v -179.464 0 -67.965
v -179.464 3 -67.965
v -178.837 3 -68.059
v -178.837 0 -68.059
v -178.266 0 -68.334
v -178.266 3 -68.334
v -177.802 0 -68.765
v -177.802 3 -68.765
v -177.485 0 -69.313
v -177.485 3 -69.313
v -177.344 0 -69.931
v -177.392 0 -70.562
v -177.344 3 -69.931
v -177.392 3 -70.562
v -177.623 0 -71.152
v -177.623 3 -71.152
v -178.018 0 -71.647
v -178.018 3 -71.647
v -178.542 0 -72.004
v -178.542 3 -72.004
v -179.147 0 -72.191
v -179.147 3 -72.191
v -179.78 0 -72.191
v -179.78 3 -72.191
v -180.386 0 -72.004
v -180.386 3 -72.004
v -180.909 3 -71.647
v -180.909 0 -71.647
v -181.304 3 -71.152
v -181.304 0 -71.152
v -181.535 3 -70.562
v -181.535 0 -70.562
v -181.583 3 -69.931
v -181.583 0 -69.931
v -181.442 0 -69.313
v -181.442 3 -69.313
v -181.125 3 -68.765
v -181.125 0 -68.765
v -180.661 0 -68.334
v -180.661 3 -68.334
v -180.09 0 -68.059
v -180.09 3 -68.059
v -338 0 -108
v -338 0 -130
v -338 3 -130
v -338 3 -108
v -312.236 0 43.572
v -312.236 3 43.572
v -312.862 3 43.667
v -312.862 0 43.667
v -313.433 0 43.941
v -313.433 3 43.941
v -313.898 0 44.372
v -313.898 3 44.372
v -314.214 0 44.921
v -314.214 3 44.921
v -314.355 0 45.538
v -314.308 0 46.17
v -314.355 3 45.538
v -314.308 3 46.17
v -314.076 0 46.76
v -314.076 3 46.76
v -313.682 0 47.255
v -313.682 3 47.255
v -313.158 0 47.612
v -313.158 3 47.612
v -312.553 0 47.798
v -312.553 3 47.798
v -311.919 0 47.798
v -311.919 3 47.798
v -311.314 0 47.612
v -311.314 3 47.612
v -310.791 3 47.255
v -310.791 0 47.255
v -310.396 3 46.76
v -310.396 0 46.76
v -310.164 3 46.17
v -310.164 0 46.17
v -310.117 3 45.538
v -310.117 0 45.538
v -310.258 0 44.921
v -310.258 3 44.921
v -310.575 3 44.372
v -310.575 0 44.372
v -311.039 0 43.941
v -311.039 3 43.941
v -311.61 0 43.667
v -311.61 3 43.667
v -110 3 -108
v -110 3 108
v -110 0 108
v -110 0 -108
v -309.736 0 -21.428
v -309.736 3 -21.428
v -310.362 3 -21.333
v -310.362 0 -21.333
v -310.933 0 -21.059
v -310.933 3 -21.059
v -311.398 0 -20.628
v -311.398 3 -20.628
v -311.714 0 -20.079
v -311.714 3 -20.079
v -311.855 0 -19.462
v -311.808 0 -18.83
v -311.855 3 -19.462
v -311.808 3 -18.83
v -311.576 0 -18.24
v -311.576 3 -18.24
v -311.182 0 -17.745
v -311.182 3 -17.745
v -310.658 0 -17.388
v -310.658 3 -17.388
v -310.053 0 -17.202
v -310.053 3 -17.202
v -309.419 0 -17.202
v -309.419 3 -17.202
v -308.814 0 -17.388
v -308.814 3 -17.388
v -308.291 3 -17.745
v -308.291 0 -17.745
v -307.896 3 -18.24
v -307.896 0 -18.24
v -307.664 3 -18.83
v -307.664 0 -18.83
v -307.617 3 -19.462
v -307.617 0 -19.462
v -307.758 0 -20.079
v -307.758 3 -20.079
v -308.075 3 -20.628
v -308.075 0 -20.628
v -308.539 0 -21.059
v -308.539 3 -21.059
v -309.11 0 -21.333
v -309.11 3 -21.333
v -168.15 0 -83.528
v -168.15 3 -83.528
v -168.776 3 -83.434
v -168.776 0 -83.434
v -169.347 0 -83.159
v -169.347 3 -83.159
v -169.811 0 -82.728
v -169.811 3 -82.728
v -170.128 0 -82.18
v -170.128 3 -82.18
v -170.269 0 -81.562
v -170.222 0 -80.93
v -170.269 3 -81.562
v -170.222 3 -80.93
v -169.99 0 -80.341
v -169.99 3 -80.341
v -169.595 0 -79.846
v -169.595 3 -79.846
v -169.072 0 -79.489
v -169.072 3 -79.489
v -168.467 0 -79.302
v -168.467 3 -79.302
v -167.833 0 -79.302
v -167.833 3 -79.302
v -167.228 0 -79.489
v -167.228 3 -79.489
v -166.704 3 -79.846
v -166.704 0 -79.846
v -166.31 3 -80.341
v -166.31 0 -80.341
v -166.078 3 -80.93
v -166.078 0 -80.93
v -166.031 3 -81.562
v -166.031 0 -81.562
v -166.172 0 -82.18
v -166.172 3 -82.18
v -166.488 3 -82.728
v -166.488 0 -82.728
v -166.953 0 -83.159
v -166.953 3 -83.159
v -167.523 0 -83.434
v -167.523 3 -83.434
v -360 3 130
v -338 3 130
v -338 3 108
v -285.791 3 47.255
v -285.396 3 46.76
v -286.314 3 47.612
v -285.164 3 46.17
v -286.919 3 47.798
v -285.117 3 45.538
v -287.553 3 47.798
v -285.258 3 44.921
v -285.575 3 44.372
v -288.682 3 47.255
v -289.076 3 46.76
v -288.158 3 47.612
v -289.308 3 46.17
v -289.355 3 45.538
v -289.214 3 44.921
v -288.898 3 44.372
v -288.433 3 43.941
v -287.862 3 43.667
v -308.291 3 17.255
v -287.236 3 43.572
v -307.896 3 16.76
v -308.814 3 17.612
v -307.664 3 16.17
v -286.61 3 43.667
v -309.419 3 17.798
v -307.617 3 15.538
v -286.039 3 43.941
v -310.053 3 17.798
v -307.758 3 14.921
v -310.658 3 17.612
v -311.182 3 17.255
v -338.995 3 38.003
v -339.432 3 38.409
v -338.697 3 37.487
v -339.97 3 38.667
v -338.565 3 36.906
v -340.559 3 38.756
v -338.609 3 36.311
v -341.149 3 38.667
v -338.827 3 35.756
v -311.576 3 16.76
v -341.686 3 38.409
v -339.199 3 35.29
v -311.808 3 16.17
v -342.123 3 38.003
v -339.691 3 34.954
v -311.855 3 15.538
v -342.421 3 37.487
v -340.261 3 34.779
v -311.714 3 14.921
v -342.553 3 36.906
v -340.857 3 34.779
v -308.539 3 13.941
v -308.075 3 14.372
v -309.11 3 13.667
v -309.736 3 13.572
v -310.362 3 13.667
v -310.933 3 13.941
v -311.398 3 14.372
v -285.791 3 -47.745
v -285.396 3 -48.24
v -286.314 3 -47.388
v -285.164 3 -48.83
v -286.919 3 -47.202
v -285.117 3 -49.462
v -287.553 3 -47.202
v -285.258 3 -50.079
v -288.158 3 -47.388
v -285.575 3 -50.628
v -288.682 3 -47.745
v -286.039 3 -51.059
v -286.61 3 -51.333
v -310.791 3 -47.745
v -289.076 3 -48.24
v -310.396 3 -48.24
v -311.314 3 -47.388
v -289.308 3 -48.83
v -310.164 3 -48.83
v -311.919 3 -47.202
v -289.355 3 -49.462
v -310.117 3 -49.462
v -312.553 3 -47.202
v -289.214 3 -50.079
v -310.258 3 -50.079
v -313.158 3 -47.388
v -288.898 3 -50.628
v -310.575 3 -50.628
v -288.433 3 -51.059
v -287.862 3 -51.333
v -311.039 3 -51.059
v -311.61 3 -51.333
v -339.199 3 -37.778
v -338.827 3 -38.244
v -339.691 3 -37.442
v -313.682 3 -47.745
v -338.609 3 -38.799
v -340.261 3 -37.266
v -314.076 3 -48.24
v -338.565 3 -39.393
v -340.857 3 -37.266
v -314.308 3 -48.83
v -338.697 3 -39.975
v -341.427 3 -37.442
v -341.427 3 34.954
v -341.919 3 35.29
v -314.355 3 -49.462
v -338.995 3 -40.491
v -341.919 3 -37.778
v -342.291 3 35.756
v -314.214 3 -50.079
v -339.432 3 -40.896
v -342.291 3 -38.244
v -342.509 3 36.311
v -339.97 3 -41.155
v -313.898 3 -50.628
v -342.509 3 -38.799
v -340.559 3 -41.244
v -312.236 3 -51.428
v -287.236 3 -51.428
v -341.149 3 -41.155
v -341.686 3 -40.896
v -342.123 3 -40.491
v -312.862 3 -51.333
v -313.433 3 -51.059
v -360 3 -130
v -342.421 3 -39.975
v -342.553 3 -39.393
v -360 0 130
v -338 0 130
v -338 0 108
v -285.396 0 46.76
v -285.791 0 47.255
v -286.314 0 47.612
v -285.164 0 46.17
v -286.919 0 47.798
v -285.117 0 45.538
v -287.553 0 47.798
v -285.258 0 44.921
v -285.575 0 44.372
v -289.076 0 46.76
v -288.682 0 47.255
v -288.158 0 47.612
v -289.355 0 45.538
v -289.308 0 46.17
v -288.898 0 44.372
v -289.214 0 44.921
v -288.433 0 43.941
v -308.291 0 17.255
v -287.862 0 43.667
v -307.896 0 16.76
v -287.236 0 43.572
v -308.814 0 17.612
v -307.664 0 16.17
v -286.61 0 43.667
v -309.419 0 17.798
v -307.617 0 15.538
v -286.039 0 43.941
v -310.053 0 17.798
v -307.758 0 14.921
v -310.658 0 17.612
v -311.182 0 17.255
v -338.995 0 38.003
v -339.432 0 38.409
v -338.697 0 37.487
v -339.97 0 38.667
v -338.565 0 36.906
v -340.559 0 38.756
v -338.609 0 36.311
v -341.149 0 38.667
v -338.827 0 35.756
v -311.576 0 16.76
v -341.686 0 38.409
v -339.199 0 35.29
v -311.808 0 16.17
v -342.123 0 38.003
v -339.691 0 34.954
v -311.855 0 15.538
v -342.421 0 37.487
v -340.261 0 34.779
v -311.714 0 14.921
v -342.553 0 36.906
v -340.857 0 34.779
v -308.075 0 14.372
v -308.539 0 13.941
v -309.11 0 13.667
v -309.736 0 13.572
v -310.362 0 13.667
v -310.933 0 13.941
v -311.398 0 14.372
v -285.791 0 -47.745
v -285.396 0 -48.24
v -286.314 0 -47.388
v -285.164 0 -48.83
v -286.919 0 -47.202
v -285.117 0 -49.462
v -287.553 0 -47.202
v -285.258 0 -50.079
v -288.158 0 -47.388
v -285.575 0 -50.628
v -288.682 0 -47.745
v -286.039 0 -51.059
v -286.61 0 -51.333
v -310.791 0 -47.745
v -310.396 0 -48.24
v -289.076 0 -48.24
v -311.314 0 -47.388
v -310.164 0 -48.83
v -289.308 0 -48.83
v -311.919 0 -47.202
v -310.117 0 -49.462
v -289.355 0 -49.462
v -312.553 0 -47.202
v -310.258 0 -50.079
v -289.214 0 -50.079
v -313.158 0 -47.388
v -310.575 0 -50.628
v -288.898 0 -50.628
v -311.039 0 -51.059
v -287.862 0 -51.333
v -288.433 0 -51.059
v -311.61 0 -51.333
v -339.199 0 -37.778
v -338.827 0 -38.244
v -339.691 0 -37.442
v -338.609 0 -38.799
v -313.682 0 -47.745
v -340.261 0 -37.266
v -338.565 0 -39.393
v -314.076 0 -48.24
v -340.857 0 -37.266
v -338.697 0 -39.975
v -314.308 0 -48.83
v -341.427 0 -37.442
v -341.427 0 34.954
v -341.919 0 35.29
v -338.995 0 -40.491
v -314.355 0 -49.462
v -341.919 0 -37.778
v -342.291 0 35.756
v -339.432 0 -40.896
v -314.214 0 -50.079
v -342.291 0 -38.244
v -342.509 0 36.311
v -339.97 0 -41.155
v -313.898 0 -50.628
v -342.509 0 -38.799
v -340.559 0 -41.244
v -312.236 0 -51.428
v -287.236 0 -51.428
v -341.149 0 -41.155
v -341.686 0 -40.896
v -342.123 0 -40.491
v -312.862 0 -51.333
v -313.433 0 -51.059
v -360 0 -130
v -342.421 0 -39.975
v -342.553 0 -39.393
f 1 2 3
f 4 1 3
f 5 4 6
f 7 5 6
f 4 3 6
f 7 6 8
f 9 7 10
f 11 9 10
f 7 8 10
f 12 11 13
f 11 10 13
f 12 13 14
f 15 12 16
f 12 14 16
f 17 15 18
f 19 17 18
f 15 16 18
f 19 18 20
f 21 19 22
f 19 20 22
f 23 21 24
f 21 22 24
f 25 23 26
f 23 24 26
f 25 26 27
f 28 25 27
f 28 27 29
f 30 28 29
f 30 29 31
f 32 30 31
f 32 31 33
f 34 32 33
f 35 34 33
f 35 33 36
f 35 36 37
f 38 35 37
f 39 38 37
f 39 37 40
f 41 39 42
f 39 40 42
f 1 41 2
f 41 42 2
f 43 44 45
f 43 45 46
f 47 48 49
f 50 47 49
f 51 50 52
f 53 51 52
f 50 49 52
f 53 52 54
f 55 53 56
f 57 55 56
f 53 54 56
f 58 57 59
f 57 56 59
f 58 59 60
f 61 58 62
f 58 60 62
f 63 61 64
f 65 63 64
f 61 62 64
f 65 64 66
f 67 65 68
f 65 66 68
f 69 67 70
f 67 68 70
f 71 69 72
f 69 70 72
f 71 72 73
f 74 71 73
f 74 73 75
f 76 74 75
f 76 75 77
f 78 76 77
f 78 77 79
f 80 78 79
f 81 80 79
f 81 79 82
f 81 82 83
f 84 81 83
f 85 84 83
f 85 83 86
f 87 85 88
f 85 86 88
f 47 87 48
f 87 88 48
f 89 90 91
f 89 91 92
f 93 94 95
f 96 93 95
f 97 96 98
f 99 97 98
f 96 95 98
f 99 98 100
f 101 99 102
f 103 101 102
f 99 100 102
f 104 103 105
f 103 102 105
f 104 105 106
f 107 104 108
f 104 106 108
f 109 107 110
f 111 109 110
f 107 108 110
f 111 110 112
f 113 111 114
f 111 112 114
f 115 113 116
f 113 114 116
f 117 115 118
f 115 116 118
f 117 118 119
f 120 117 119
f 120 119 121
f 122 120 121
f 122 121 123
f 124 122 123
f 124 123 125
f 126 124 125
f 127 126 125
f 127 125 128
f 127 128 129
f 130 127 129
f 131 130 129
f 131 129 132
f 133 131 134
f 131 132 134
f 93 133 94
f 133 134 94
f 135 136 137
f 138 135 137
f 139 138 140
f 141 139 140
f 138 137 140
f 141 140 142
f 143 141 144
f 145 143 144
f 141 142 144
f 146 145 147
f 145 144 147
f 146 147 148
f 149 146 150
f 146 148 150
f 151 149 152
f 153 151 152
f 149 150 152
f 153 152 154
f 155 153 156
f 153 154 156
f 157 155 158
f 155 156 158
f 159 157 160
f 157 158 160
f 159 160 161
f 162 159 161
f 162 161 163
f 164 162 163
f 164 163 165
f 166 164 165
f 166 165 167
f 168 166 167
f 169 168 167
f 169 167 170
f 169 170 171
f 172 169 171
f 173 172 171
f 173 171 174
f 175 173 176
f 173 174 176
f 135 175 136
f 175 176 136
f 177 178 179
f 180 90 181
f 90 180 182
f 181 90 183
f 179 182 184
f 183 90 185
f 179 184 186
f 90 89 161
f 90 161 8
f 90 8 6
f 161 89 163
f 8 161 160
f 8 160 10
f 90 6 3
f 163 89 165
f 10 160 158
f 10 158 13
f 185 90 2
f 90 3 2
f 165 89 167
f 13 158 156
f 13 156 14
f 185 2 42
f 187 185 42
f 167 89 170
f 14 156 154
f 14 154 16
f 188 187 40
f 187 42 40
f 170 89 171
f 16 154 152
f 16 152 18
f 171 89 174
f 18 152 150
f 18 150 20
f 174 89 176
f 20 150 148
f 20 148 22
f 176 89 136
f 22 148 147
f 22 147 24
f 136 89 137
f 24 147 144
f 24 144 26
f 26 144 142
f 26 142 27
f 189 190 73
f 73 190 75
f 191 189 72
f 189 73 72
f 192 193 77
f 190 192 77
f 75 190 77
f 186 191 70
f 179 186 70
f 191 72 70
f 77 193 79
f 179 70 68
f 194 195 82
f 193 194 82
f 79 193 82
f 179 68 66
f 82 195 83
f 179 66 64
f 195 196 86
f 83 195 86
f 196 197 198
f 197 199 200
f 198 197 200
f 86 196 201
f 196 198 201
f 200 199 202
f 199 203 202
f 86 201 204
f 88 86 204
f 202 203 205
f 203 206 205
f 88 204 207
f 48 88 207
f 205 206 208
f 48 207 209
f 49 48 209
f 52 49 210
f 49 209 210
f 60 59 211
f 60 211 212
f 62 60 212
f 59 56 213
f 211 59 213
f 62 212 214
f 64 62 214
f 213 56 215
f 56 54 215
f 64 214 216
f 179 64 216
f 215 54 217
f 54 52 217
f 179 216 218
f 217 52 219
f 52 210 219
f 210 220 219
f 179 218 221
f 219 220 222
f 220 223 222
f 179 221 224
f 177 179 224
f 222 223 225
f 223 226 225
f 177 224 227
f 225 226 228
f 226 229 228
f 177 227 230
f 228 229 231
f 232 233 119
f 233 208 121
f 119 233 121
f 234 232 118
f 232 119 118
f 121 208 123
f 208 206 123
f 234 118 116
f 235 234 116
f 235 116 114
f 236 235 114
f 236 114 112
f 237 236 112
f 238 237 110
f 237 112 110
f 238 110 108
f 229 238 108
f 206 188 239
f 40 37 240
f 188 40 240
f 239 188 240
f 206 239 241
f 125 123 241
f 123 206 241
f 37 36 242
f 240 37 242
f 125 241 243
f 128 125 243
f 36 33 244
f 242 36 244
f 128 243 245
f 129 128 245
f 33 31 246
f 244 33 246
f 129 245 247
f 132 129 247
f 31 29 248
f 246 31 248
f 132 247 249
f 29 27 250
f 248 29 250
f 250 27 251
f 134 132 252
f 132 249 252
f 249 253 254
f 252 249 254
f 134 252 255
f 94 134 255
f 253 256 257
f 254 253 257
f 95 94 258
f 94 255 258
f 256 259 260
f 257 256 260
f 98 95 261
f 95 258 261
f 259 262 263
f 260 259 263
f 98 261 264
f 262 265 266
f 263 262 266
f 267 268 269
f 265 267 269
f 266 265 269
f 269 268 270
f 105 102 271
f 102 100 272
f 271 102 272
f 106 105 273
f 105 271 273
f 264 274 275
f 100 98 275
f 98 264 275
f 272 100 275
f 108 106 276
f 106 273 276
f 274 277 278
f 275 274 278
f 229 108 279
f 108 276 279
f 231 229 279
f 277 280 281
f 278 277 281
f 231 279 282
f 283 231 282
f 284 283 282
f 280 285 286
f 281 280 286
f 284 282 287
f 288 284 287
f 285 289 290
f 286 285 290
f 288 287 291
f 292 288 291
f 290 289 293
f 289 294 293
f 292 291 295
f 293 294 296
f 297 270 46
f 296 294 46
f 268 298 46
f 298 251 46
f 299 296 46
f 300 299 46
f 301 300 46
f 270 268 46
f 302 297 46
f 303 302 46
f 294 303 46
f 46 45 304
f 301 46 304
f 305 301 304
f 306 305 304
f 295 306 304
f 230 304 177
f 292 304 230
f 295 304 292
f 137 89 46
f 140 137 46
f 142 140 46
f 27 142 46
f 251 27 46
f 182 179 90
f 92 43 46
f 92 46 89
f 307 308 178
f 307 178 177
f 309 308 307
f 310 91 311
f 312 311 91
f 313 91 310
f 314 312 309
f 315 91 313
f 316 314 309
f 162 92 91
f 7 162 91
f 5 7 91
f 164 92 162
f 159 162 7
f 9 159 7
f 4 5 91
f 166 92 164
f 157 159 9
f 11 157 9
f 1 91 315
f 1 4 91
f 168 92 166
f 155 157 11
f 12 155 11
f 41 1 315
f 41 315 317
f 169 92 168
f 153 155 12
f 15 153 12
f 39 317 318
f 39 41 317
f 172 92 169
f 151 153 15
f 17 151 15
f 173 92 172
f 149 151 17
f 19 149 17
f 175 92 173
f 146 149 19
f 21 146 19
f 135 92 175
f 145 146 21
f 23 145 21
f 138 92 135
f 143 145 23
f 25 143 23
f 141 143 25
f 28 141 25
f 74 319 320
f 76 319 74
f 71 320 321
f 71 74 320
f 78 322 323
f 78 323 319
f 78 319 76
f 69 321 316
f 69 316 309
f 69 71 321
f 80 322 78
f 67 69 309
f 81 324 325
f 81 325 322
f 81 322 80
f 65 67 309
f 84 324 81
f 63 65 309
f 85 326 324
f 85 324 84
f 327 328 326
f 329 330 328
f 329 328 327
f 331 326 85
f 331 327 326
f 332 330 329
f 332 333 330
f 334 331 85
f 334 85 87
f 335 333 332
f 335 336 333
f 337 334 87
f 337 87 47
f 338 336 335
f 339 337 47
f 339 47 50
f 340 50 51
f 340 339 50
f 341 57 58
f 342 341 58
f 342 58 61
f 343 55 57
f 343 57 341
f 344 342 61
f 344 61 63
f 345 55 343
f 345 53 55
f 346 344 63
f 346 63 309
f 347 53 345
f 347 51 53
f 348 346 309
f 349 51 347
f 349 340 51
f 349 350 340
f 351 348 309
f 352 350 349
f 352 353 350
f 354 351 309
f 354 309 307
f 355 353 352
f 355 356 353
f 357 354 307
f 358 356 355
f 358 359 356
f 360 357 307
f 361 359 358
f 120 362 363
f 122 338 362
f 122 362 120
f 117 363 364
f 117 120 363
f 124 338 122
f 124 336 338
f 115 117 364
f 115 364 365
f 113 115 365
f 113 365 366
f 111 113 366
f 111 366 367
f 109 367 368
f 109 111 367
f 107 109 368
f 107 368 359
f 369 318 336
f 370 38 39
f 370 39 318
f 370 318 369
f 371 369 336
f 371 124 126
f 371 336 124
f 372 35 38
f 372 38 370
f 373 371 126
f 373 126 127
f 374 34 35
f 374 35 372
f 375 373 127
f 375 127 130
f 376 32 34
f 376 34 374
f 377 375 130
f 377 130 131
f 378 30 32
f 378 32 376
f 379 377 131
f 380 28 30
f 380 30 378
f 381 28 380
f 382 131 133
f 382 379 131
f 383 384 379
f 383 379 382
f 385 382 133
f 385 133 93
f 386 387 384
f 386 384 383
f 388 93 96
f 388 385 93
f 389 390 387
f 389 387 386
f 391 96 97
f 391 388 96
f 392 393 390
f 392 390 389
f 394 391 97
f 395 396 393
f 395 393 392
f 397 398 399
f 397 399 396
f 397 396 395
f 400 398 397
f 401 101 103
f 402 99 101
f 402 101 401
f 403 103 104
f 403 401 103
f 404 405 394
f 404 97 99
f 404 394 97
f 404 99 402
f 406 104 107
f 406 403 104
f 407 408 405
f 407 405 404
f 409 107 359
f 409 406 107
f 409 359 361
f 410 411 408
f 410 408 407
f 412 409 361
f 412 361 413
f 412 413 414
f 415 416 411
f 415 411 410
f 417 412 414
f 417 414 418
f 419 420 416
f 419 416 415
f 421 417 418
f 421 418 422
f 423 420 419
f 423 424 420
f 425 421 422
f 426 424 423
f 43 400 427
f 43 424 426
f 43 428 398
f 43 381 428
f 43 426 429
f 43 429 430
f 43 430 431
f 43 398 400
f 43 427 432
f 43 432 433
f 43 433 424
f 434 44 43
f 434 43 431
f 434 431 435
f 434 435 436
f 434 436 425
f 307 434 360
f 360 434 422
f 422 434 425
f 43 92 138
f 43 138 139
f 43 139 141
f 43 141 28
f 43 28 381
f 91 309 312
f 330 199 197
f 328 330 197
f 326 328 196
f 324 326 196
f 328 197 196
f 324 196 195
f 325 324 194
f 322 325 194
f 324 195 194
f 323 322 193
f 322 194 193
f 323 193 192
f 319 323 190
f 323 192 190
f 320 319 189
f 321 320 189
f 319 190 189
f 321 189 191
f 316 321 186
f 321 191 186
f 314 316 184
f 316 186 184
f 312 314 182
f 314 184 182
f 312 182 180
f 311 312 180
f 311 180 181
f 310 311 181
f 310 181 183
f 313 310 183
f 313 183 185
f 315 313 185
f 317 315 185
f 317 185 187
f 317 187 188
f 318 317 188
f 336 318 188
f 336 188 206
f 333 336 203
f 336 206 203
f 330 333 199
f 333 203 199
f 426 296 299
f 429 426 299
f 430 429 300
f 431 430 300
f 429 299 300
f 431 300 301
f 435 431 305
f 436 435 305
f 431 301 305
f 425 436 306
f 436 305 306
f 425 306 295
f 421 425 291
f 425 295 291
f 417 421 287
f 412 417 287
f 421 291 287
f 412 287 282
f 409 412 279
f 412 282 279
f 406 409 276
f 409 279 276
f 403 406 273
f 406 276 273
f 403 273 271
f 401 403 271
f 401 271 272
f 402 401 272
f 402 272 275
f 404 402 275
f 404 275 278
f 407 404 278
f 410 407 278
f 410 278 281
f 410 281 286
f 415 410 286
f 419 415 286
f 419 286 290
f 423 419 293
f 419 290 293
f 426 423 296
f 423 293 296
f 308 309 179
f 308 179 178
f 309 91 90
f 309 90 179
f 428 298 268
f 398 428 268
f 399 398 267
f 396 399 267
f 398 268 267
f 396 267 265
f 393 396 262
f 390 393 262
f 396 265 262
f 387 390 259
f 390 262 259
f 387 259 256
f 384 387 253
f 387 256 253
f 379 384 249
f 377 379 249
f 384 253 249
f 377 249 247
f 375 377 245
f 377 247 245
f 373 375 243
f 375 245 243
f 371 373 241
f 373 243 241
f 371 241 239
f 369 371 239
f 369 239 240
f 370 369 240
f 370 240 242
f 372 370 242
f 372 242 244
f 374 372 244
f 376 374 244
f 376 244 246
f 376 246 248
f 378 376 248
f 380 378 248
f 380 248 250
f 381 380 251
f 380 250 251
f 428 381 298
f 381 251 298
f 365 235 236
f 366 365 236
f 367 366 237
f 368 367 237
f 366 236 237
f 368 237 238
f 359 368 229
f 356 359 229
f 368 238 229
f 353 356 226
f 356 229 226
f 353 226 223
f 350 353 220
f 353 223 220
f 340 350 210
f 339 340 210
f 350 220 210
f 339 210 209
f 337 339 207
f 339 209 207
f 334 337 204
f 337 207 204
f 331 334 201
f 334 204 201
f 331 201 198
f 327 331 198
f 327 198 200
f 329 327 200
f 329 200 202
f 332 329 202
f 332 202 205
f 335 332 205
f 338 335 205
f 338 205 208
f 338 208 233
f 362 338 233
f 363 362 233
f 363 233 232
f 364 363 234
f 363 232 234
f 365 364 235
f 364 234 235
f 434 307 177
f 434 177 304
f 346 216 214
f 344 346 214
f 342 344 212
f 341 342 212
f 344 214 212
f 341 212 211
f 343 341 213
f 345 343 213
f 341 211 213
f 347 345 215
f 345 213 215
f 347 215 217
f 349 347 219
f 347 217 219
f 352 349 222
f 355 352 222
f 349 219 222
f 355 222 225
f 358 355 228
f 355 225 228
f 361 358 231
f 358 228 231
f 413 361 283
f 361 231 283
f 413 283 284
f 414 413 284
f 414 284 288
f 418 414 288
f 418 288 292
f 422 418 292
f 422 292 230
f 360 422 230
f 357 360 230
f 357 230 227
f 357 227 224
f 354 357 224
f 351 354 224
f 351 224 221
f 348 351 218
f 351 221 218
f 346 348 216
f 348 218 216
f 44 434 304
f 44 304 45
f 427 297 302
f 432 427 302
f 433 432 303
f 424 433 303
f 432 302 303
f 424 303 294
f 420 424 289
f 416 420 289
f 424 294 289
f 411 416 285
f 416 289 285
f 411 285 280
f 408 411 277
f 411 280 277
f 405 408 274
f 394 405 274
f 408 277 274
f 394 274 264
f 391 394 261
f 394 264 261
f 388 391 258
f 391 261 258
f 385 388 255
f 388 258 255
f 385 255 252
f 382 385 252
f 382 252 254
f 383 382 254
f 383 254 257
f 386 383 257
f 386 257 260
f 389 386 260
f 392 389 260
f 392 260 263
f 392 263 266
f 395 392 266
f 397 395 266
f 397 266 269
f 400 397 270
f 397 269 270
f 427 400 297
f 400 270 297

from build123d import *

# Parameters (mm, degrees)
BOSS_EXTRUDE1_DEPTH = 3
SKETCH2_R           = 2.125
CUT_EXTRUDE1_DEPTH  = 3
SKETCH3_R           = 2
CUT_EXTRUDE2_DEPTH  = 3
SKETCH4_R           = 2.125
CUT_EXTRUDE3_DEPTH  = 3
SKETCH5_W           = 470
SKETCH5_H           = 260
CUT_EXTRUDE4_DEPTH  = 3


with BuildPart() as part:
    # Sketch1 → Boss-Extrude1 (new body)
    with BuildSketch(Plane(origin=(0, 0, 0), x_dir=(1, 0, 0), z_dir=(0, 1, 0))):
        Polygon((-360, -130), (-360, 130), (-338, 130), (-338, 108), (338, 108), (338, 130), (360, 130), (360, -130), (338, -130), (338, -108), (-338, -108), (-338, -130), align=None)
    extrude(amount=BOSS_EXTRUDE1_DEPTH)

    # Sketch2 → Cut-Extrude1 (cut)
    with BuildSketch(Plane(origin=(0, 3, 0), x_dir=(1, 0, 0), z_dir=(0, 1, 0))):
        with Locations(Location((307.763857235, 49.302866975, 0), (0, 0, 270))):
            Circle(SKETCH2_R)
        with Locations(Location((282.763857235, 49.302866975, 0), (0, 0, 270))):
            Circle(SKETCH2_R)
        with Locations(Location((305.263857235, 19.302866975, 0), (0, 0, 270))):
            Circle(SKETCH2_R)
        with Locations(Location((305.263857235, -15.697133025, 0), (0, 0, 270))):
            Circle(SKETCH2_R)
        with Locations(Location((307.763857235, -45.697133025, 0), (0, 0, 270))):
            Circle(SKETCH2_R)
        with Locations(Location((282.763857235, -45.697133025, 0), (0, 0, 270))):
            Circle(SKETCH2_R)
        with Locations(Location((-287.236142765, -45.697133025, 0), (0, 0, 90))):
            Circle(SKETCH2_R)
        with Locations(Location((-312.236142765, -45.697133025, 0), (0, 0, 90))):
            Circle(SKETCH2_R)
        with Locations(Location((-309.736142765, -15.697133025, 0), (0, 0, 90))):
            Circle(SKETCH2_R)
        with Locations(Location((-309.736142765, 19.302866975, 0), (0, 0, 90))):
            Circle(SKETCH2_R)
        with Locations(Location((-287.236142765, 49.302866975, 0), (0, 0, 90))):
            Circle(SKETCH2_R)
        with Locations(Location((-312.236142765, 49.302866975, 0), (0, 0, 90))):
            Circle(SKETCH2_R)
    extrude(amount=-CUT_EXTRUDE1_DEPTH, mode=Mode.SUBTRACT)

    # Sketch3 → Cut-Extrude2 (cut)
    with BuildSketch(Plane(origin=(0, 3, 0), x_dir=(1, 0, 0), z_dir=(0, 1, 0))):
        with Locations(Location((339.440964309, 39.243831284, 0), (0, 0, 270))):
            Circle(SKETCH3_R)
        with Locations(Location((339.440964309, -36.756168716, 0), (0, 0, 90))):
            Circle(SKETCH3_R)
        with Locations(Location((-340.559035691, -36.756168716, 0), (0, 0, 270))):
            Circle(SKETCH3_R)
        with Locations(Location((-340.559035691, 39.243831284, 0), (0, 0, 90))):
            Circle(SKETCH3_R)
    extrude(amount=-CUT_EXTRUDE2_DEPTH, mode=Mode.SUBTRACT)

    # Sketch4 → Cut-Extrude3 (cut)
    with BuildSketch(Plane(origin=(0, 3, 0), x_dir=(1, 0, 0), z_dir=(0, 1, 0))):
        with Locations((66.609635331, -175.983550473)):
            Circle(SKETCH4_R)
        with Locations(Location((-179.463524521, 70.08960938, 0), (0, 0, 270))):
            Circle(SKETCH4_R)
        with Locations(Location((-15.414751286, -93.959163855, 0), (0, 0, 270))):
            Circle(SKETCH4_R)
        with Locations(Location((-97.439137904, -11.934777238, 0), (0, 0, 270))):
            Circle(SKETCH4_R)
        with Locations((77.92334383, -164.669841974)):
            Circle(SKETCH4_R)
        with Locations(Location((-4.101042787, -82.645455356, 0), (0, 0, 90))):
            Circle(SKETCH4_R)
        with Locations(Location((-86.125429405, -0.621068739, 0), (0, 0, 90))):
            Circle(SKETCH4_R)
        with Locations(Location((-168.149816022, 81.403317879, 0), (0, 0, 90))):
            Circle(SKETCH4_R)
        with Locations((-49.355876783, 200.197257118)):
            Circle(SKETCH4_R)
        with Locations((32.668509835, 118.172870501)):
            Circle(SKETCH4_R)
        with Locations(Location((114.692896452, 36.148483883, 0), (0, 0, 270))):
            Circle(SKETCH4_R)
        with Locations(Location((196.71728307, -45.875902734, 0), (0, 0, 270))):
            Circle(SKETCH4_R)
        with Locations((43.982218334, 129.486579)):
            Circle(SKETCH4_R)
        with Locations(Location((126.006604951, 47.462192382, 0), (0, 0, 90))):
            Circle(SKETCH4_R)
        with Locations((-38.042168284, 211.510965617)):
            Circle(SKETCH4_R)
        with Locations(Location((208.030991569, -34.562194235, 0), (0, 0, 90))):
            Circle(SKETCH4_R)
    extrude(amount=-CUT_EXTRUDE3_DEPTH, mode=Mode.SUBTRACT)

    # Sketch5 → Cut-Extrude4 (cut)
    with BuildSketch(Plane(origin=(0, 3, 0), x_dir=(1, 0, 0), z_dir=(0, 1, 0))):
        with Locations((125, 0)):
            Rectangle(SKETCH5_W, SKETCH5_H)
    extrude(amount=-CUT_EXTRUDE4_DEPTH, mode=Mode.SUBTRACT)


solid = part.part
